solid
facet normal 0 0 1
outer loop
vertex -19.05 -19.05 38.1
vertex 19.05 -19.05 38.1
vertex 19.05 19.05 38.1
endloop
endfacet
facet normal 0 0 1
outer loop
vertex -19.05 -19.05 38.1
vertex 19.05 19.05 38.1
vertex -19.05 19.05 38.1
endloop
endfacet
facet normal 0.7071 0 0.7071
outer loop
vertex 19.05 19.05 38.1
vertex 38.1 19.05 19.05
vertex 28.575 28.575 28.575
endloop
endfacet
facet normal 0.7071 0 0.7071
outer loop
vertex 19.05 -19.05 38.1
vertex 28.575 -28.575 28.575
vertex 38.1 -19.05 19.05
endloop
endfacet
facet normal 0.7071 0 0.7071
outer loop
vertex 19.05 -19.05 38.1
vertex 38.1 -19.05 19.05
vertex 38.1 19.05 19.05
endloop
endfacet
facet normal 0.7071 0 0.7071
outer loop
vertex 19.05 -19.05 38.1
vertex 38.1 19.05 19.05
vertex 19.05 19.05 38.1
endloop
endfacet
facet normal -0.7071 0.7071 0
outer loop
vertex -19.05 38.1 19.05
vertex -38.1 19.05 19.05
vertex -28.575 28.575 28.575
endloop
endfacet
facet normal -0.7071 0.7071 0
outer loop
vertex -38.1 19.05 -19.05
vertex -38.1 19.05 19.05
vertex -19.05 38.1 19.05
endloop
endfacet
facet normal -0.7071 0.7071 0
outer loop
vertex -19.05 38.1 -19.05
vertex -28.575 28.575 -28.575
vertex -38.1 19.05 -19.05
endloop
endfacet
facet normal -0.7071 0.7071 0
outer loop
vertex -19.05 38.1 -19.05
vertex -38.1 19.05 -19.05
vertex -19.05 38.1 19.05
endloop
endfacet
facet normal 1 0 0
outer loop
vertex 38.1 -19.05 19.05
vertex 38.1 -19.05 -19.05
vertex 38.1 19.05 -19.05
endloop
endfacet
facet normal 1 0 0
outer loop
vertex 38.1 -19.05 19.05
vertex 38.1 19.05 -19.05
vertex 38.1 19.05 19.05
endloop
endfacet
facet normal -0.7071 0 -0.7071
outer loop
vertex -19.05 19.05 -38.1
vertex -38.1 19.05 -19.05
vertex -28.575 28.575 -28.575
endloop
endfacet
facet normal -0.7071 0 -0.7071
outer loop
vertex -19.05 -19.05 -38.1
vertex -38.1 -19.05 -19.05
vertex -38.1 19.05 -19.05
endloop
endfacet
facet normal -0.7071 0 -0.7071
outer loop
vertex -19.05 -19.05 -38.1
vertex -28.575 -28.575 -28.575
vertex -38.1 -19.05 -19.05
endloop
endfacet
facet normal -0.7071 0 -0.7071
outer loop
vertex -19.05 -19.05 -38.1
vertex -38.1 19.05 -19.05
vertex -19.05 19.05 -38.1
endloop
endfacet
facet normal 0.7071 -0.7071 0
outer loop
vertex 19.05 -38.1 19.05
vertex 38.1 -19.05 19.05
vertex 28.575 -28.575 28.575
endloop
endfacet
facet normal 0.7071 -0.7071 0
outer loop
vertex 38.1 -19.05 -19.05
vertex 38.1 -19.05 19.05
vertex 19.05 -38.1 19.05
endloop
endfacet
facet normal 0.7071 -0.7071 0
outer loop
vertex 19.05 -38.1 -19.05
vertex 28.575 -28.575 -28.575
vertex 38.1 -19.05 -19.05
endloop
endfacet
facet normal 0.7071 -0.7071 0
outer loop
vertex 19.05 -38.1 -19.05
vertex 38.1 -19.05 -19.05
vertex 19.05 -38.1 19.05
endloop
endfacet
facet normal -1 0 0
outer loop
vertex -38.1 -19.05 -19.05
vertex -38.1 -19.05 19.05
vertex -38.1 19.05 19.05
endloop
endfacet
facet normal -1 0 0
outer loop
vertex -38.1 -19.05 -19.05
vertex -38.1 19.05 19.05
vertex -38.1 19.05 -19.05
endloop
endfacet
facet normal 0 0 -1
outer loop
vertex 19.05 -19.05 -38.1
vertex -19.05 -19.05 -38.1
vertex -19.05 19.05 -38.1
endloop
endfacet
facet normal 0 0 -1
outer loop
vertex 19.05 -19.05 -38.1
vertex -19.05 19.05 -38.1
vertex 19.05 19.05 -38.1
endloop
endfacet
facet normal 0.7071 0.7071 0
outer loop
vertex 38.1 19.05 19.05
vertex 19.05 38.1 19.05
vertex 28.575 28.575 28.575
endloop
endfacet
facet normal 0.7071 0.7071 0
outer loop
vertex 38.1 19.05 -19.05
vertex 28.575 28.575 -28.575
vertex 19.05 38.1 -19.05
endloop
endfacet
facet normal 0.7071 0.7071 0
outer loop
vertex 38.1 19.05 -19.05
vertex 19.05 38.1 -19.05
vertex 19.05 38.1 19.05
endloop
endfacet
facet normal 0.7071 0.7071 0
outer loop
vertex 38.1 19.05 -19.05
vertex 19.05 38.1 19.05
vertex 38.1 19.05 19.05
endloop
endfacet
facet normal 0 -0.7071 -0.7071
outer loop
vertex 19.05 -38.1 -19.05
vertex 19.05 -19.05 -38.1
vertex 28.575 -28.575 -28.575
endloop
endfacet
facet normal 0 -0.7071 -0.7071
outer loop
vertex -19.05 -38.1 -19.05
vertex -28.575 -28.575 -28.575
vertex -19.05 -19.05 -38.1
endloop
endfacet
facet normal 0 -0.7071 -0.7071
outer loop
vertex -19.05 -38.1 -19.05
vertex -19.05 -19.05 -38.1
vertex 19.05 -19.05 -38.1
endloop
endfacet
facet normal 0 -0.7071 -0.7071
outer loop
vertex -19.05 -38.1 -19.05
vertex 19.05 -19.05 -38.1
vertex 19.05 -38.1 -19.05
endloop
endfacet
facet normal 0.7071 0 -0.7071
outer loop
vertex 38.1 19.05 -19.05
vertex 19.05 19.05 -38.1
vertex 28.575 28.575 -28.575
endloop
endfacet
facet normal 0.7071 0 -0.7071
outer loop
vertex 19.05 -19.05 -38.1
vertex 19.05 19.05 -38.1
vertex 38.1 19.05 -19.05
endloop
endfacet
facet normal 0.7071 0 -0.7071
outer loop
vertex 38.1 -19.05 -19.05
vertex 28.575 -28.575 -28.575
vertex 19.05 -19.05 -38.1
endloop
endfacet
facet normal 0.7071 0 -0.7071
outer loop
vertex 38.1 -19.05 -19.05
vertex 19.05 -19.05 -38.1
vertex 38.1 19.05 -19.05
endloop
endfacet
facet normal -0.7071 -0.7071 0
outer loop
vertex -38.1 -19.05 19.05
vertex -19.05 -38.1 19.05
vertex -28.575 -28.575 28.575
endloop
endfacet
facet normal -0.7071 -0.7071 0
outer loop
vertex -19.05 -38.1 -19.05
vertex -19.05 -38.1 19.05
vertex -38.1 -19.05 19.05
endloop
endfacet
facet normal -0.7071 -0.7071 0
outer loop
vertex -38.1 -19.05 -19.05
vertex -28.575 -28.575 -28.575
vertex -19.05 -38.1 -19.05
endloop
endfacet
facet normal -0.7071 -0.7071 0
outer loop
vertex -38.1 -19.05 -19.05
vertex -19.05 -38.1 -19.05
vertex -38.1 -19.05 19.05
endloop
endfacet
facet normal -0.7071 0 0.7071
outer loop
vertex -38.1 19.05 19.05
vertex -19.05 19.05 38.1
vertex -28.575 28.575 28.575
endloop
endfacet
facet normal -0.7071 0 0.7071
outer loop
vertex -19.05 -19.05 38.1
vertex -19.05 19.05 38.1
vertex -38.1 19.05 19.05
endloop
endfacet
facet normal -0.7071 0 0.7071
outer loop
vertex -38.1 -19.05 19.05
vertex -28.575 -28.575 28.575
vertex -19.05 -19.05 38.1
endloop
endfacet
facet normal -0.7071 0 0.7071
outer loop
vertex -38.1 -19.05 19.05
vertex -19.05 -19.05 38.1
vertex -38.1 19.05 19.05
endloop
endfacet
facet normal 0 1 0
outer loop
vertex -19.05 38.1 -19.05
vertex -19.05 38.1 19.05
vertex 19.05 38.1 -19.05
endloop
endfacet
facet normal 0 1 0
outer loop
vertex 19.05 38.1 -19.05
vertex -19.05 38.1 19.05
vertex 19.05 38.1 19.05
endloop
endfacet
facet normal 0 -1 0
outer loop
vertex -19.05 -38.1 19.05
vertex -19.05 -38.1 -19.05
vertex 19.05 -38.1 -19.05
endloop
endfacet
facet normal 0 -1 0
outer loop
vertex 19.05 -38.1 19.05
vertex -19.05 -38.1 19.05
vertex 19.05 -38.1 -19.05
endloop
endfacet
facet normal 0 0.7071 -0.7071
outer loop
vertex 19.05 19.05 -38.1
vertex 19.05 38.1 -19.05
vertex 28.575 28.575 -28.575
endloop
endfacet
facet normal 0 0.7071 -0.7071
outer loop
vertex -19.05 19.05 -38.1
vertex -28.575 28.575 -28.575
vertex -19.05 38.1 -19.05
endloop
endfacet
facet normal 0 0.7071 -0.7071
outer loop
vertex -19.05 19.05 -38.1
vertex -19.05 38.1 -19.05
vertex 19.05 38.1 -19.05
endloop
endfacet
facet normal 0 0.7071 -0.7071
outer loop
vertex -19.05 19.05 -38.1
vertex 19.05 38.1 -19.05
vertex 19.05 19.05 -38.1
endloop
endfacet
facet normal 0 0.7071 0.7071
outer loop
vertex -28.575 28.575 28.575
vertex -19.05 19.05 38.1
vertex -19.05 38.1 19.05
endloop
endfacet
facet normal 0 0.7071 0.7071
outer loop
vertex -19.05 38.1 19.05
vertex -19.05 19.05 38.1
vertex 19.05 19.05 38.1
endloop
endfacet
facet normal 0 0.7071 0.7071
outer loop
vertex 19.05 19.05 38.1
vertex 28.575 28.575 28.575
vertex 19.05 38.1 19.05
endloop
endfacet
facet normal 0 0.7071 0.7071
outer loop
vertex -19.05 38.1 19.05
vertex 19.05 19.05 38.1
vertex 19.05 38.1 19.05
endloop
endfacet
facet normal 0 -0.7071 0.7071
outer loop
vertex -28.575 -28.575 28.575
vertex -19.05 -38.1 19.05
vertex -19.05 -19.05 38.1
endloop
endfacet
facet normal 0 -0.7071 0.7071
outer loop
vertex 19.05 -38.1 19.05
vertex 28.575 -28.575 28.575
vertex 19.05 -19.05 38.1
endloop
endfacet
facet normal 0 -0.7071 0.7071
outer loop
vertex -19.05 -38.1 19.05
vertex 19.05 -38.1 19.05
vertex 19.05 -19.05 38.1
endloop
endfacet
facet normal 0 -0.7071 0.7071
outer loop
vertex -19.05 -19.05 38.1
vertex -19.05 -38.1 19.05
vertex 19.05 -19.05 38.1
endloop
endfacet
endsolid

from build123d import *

# Parameters (mm, degrees)
F1_DEPTH = 38.1
F2_DEPTH = 38.1
F4_DEPTH = 38.1
F5_DEPTH = 38.1
F7_DEPTH = 38.1
F8_DEPTH = 38.1


with BuildPart() as f1:
    # F0 (on Front) → F1 (new body)
    with BuildSketch(Plane.XZ):
        Polygon((-19.05, 38.1), (-38.1, 19.05), (-38.1, -19.05), (-19.05, -38.1), (19.05, -38.1), (38.1, -19.05), (38.1, 19.05), (19.05, 38.1), align=None)
    extrude(amount=F1_DEPTH)

    # F0 (on Front) → F2 (join)
    with BuildSketch(Plane.XZ):
        Polygon((-19.05, 38.1), (-38.1, 19.05), (-38.1, -19.05), (-19.05, -38.1), (19.05, -38.1), (38.1, -19.05), (38.1, 19.05), (19.05, 38.1), align=None)
    extrude(amount=-F2_DEPTH)

    # F3 (on Right) → F4 (cut)
    with BuildSketch(Plane.YZ):
        Polygon((-38.1, 38.1), (-38.1, 19.05), (-19.05, 38.1), align=None)
        Polygon((38.1, 38.1), (19.05, 38.1), (38.1, 19.05), align=None)
        Polygon((38.1, -19.05), (19.05, -38.1), (38.1, -38.1), align=None)
        Polygon((-19.05, -38.1), (-38.1, -19.05), (-38.1, -38.1), align=None)
    extrude(amount=-F4_DEPTH, mode=Mode.SUBTRACT)

    # F3 (on Right) → F5 (cut)
    with BuildSketch(Plane.YZ):
        Polygon((-38.1, 38.1), (-38.1, 19.05), (-19.05, 38.1), align=None)
        Polygon((38.1, 38.1), (19.05, 38.1), (38.1, 19.05), align=None)
        Polygon((38.1, -19.05), (19.05, -38.1), (38.1, -38.1), align=None)
        Polygon((-19.05, -38.1), (-38.1, -19.05), (-38.1, -38.1), align=None)
    extrude(amount=F5_DEPTH, mode=Mode.SUBTRACT)

    # F6 (on Top) → F7 (cut)
    with BuildSketch(Plane.XY):
        Polygon((38.1, -19.05), (19.05, -38.1), (38.1, -38.1), align=None)
        Polygon((19.05, 38.1), (38.1, 19.05), (38.1, 38.1), align=None)
        Polygon((-38.1, 38.1), (-38.1, 19.05), (-19.05, 38.1), align=None)
        Polygon((-38.1, -38.1), (-19.05, -38.1), (-38.1, -19.05), align=None)
    extrude(amount=-F7_DEPTH, mode=Mode.SUBTRACT)

    # F6 (on Top) → F8 (cut)
    with BuildSketch(Plane.XY):
        Polygon((38.1, -19.05), (19.05, -38.1), (38.1, -38.1), align=None)
        Polygon((-38.1, -38.1), (-19.05, -38.1), (-38.1, -19.05), align=None)
        Polygon((-38.1, 38.1), (-38.1, 19.05), (-19.05, 38.1), align=None)
        Polygon((19.05, 38.1), (38.1, 19.05), (38.1, 38.1), align=None)
    extrude(amount=F8_DEPTH, mode=Mode.SUBTRACT)


solid = f1.part
